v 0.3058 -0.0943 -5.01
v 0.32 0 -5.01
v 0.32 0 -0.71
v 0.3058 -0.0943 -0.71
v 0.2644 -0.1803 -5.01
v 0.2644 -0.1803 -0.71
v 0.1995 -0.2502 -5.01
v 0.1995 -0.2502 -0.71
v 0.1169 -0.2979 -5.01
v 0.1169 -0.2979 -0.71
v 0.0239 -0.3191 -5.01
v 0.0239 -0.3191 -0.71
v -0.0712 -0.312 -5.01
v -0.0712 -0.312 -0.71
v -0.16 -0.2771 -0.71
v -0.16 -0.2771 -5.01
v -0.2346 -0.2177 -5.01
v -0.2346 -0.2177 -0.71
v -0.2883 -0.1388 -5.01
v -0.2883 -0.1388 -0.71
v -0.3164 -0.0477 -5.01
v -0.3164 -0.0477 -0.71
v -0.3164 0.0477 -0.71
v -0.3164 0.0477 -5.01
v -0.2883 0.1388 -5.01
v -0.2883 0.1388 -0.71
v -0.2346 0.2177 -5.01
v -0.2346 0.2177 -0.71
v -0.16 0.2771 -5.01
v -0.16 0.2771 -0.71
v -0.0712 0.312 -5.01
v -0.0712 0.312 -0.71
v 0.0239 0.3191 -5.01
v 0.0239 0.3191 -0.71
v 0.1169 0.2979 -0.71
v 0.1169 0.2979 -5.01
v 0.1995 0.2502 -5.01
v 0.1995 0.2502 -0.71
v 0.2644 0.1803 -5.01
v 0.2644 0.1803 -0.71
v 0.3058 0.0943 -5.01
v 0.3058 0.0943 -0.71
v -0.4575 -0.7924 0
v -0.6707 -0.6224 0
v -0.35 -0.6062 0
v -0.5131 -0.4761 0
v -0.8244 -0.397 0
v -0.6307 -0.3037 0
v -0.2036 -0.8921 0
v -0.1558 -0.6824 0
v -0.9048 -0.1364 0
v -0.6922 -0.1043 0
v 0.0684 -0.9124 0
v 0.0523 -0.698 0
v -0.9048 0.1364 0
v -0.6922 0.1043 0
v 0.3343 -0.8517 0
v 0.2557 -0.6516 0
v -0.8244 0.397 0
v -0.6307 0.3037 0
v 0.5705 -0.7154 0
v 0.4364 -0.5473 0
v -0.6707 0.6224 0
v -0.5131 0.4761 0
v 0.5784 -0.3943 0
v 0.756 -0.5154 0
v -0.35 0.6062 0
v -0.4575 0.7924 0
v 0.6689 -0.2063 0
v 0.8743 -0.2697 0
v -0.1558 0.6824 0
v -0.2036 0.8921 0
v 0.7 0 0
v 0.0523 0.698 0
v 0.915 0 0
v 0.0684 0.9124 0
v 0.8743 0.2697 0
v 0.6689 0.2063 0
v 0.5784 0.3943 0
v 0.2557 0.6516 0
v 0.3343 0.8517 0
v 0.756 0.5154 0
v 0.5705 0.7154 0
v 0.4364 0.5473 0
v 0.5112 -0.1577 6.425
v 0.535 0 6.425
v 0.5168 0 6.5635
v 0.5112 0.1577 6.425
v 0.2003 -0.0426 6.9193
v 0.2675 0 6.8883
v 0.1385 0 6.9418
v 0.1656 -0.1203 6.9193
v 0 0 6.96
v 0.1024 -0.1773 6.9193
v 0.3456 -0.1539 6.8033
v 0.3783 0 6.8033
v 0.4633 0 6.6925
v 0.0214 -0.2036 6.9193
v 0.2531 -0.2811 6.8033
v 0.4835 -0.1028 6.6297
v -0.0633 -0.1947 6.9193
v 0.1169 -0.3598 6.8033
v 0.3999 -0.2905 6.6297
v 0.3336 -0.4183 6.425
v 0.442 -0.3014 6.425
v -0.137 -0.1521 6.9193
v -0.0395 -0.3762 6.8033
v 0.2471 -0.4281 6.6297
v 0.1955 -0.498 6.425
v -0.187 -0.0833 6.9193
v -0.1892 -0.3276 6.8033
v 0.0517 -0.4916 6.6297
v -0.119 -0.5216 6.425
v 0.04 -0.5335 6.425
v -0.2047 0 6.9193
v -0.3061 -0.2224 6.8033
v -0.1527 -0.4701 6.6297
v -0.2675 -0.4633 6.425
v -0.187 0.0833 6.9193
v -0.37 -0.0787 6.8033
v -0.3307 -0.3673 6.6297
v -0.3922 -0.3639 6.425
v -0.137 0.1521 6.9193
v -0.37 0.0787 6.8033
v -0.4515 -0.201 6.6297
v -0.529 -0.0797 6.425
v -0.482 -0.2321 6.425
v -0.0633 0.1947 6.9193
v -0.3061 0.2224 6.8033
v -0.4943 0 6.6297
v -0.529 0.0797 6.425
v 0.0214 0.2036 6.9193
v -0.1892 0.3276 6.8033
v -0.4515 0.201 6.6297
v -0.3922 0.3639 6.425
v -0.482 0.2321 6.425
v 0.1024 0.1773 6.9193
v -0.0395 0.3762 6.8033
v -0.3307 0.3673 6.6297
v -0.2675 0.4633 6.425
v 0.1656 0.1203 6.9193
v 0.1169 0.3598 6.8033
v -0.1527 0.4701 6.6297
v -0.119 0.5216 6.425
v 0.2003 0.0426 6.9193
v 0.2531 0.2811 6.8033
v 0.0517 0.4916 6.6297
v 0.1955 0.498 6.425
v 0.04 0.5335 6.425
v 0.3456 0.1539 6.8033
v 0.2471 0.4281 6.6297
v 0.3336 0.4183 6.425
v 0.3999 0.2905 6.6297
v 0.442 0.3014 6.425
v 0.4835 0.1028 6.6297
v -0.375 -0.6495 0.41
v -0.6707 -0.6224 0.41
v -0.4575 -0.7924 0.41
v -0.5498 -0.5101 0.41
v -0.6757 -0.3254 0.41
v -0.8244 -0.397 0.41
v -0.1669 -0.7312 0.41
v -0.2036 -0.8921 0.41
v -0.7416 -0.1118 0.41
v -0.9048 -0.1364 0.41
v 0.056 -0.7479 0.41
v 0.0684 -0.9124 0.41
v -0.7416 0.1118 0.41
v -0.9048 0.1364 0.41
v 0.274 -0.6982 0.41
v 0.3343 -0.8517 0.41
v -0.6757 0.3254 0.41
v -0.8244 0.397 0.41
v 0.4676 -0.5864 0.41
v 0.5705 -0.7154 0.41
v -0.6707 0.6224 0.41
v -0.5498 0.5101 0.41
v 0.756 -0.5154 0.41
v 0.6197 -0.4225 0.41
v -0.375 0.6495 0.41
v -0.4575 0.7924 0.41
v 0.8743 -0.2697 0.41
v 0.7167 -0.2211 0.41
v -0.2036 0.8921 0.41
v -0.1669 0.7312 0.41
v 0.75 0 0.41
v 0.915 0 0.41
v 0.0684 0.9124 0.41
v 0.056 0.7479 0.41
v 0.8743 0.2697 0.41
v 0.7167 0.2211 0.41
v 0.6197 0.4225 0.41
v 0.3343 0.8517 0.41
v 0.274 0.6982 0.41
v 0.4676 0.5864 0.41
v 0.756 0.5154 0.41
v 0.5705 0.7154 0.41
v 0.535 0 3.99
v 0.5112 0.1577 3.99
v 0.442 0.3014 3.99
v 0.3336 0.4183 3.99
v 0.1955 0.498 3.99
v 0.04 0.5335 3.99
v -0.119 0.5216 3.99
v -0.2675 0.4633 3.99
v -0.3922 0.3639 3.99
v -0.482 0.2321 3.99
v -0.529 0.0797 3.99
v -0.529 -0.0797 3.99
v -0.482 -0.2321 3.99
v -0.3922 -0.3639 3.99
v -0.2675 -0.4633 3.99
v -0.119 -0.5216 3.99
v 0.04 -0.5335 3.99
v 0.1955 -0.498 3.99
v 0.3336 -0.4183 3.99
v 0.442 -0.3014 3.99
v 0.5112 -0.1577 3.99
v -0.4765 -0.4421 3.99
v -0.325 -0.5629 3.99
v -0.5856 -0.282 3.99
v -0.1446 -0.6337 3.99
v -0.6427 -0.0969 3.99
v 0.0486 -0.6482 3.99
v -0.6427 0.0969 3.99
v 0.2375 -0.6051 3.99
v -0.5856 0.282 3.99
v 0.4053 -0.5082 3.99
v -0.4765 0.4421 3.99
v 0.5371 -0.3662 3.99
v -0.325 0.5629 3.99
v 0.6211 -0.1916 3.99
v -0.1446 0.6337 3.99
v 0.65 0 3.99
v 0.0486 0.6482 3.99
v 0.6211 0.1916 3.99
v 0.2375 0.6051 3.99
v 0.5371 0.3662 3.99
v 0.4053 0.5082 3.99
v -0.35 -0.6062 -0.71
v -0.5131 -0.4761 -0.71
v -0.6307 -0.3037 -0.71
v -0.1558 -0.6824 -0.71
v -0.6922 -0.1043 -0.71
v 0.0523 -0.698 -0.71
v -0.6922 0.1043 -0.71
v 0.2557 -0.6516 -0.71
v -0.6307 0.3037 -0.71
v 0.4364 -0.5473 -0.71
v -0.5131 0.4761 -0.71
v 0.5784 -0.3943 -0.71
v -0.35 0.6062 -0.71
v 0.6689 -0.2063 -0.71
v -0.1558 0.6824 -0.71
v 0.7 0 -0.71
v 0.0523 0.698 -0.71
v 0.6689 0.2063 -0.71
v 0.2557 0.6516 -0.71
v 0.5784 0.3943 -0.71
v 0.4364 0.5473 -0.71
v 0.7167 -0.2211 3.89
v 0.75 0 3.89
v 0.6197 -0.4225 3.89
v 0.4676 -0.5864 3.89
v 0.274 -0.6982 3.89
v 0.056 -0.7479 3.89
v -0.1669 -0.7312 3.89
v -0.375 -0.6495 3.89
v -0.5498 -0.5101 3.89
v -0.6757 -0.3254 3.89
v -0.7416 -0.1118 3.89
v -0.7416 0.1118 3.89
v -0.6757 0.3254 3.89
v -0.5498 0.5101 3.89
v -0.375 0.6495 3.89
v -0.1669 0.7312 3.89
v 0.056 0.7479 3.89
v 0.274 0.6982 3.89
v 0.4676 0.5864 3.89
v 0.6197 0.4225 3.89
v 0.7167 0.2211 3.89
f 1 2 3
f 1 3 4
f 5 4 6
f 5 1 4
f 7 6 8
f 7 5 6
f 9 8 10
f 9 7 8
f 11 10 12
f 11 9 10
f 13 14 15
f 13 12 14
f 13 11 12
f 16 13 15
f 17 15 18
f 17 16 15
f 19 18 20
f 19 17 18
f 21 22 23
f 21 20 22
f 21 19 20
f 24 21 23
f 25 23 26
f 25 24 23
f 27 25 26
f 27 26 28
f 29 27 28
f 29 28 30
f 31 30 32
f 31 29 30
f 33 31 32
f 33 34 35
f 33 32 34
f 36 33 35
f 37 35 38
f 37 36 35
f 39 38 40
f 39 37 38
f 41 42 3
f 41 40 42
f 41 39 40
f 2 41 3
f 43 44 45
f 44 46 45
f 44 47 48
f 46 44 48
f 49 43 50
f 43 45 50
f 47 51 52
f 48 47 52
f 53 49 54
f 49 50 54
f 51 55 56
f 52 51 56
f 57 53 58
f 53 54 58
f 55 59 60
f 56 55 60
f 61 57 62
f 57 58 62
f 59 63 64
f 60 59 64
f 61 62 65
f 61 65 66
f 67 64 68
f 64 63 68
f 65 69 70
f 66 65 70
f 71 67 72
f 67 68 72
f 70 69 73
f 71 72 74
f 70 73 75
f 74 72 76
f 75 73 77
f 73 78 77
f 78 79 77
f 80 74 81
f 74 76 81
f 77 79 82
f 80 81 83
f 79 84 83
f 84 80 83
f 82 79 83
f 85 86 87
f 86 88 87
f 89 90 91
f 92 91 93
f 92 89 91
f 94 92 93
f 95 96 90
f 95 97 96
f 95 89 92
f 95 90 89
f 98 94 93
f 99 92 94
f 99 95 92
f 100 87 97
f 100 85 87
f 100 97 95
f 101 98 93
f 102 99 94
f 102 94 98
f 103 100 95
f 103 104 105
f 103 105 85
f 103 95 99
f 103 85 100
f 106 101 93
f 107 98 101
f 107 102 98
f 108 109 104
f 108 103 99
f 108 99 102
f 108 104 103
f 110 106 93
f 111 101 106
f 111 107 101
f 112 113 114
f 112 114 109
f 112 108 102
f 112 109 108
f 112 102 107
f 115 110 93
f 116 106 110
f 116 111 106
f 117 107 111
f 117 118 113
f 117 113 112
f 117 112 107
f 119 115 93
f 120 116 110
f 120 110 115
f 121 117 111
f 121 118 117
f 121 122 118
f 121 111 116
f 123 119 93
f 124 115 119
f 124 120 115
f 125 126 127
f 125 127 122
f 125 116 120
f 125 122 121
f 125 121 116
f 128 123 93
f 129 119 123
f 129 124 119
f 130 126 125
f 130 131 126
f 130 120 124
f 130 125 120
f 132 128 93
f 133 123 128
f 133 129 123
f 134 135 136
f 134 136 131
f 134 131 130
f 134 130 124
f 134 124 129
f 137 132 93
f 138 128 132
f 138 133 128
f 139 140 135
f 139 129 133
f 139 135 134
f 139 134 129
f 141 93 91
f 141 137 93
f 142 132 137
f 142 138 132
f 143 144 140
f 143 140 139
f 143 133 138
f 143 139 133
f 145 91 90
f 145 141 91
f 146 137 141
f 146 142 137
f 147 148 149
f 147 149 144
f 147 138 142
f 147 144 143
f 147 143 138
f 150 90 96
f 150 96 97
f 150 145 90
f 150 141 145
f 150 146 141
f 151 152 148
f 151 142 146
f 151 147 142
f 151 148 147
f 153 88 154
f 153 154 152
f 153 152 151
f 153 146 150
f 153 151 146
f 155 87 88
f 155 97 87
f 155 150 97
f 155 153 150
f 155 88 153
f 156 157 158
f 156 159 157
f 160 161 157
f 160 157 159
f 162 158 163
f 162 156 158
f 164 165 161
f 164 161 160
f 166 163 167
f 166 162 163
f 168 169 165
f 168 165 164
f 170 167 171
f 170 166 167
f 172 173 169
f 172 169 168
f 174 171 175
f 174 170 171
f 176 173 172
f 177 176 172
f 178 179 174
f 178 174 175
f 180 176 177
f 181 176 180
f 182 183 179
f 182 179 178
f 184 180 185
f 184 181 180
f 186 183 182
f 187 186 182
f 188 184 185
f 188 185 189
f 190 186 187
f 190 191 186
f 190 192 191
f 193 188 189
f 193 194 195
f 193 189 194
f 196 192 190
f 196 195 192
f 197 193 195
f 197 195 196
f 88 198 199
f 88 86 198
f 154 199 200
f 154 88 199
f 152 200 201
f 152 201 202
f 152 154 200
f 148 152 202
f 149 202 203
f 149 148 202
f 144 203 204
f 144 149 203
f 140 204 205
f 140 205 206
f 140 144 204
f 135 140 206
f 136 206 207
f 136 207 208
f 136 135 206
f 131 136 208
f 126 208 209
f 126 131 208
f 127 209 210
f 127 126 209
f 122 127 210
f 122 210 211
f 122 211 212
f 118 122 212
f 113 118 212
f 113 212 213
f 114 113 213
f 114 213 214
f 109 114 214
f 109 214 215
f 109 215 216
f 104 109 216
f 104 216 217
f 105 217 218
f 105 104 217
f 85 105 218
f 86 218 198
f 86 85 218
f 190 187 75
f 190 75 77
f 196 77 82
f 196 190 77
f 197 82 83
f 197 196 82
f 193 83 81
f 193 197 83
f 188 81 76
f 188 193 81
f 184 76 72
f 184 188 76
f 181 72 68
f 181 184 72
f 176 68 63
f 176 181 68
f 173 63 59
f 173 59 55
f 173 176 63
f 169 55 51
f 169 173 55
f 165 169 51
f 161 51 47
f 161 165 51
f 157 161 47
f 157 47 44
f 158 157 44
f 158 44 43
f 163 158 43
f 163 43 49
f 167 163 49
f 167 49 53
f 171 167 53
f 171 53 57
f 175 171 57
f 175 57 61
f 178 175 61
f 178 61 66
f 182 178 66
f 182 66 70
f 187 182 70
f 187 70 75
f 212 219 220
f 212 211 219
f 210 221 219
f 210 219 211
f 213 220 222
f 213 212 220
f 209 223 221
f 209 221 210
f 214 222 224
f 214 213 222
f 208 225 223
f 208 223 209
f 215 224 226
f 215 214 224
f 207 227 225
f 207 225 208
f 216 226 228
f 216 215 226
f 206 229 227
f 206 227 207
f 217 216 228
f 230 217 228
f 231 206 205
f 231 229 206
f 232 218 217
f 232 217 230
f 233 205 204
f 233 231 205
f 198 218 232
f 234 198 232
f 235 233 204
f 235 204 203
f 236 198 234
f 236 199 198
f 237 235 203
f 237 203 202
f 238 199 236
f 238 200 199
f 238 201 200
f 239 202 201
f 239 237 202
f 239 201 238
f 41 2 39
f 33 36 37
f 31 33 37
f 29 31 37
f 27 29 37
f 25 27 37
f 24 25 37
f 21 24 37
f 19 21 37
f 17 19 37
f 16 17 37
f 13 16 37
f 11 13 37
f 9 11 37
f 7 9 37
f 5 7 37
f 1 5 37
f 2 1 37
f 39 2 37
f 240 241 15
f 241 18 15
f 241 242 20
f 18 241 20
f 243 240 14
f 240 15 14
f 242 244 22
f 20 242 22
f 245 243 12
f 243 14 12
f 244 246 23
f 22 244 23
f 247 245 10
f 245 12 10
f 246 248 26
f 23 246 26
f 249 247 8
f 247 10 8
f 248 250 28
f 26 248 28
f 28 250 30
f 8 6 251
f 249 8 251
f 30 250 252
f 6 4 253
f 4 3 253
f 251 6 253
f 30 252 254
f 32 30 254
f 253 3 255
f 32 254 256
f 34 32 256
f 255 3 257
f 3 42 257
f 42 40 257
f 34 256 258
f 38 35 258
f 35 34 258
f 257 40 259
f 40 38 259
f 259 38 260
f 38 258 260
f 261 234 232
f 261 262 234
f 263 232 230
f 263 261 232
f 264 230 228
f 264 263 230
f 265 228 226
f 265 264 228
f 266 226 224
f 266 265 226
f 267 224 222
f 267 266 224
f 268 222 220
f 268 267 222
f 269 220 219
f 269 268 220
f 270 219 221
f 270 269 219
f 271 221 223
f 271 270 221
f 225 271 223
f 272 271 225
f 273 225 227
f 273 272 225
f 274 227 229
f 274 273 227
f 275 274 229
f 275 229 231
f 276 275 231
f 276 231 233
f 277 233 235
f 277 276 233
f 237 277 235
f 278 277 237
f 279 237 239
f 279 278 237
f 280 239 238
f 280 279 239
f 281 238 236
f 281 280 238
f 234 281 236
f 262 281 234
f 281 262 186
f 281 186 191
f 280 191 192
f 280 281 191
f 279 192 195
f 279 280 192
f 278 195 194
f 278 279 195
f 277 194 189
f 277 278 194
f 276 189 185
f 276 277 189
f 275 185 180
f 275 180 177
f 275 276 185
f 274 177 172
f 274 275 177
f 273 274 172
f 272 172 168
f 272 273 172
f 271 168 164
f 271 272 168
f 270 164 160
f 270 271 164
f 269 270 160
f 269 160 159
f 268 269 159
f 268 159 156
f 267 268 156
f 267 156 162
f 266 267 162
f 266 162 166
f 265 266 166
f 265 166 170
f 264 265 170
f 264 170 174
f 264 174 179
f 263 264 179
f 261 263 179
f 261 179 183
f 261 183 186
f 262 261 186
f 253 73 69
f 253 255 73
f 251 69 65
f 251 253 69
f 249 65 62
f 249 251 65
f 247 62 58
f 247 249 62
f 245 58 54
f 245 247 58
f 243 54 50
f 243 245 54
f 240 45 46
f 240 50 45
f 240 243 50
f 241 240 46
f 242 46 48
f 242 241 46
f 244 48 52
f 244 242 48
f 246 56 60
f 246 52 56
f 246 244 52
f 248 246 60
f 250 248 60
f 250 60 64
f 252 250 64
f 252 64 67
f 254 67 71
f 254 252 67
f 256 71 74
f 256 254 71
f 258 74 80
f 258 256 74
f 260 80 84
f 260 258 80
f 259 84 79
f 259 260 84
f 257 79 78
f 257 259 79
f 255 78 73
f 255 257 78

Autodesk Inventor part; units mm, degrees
ref_plane "YZ Plane" through (0, 0, 0) normal (1, 0, 0) x (0, 1, 0)
ref_plane "XZ Plane" through (0, 0, 0) normal (0, 1, 0) x (-1, 0, 0)
sketch "Skizze1" plane through (0, 0, 0) normal (0, 1, 0) x (-1, 0, 0)
  line L0 (0, -5.01) -> (0, 6.96)
  line L1 (-0.7, 0) -> (-0.915, 0)
  line L2 (-0.915, 0) -> (-0.915, 0.41)
  line L3 (-0.915, 0.41) -> (-0.75, 0.41)
  line L4 (-0.75, 0.41) -> (-0.75, 3.99)
  line L5 (-0.75, 3.99) -> (-0.535, 3.99)
  line L6 (-0.535, 3.99) -> (-0.535, 6.425)
  arc A0 (0, 6.96) -> (-0.535, 6.425) centre (0, 6.425) ccw
  line L7 (-0.535, 6.425) -> (0, 6.425) construction
  line L8 (-0.7, 0) -> (-0.7, -0.71)
  line L9 (-0.7, -0.71) -> (-0.32, -0.71)
  line L10 (-0.32, -0.71) -> (-0.32, -5.01)
  line L11 (-0.32, -5.01) -> (0, -5.01)
  line L12 (0, -7.4262) -> (0, 9.487) projected
  line L13 (-1.098, 0) -> (0.183, 0) projected
  dimension "d0" = 1.07
  dimension "d1" = 0.41
  dimension "d2" = 1.83
  dimension "d3" = 1.5
  dimension "d5" = 6.96
  dimension "d10" = 0.71
  dimension "d11" = 0.7
  dimension "d12" = 4.3
  dimension "d15" = 0.64
  dimension "d16" = 4.7
revolve "Umdrehung1" add sketch "Skizze1" angle 360 about axis through (0, 0, -5.01) along (0, 0, 1)
chamfer "Fase1" distance 0.1 angle 45 1 edges at (-0.75, 0, 3.99)
ref_plane "Arbeitsebene2" through (0, 0, 4.67) normal (0, 0, 1) x (1, 0, 0)
ref_plane "Arbeitsebene1" through (0, 0, 6.96) normal (0, 0, 1) x (1, 0, 0)
properties part number "Federkontakt D1.5" material "Kupfer, Legierung"
